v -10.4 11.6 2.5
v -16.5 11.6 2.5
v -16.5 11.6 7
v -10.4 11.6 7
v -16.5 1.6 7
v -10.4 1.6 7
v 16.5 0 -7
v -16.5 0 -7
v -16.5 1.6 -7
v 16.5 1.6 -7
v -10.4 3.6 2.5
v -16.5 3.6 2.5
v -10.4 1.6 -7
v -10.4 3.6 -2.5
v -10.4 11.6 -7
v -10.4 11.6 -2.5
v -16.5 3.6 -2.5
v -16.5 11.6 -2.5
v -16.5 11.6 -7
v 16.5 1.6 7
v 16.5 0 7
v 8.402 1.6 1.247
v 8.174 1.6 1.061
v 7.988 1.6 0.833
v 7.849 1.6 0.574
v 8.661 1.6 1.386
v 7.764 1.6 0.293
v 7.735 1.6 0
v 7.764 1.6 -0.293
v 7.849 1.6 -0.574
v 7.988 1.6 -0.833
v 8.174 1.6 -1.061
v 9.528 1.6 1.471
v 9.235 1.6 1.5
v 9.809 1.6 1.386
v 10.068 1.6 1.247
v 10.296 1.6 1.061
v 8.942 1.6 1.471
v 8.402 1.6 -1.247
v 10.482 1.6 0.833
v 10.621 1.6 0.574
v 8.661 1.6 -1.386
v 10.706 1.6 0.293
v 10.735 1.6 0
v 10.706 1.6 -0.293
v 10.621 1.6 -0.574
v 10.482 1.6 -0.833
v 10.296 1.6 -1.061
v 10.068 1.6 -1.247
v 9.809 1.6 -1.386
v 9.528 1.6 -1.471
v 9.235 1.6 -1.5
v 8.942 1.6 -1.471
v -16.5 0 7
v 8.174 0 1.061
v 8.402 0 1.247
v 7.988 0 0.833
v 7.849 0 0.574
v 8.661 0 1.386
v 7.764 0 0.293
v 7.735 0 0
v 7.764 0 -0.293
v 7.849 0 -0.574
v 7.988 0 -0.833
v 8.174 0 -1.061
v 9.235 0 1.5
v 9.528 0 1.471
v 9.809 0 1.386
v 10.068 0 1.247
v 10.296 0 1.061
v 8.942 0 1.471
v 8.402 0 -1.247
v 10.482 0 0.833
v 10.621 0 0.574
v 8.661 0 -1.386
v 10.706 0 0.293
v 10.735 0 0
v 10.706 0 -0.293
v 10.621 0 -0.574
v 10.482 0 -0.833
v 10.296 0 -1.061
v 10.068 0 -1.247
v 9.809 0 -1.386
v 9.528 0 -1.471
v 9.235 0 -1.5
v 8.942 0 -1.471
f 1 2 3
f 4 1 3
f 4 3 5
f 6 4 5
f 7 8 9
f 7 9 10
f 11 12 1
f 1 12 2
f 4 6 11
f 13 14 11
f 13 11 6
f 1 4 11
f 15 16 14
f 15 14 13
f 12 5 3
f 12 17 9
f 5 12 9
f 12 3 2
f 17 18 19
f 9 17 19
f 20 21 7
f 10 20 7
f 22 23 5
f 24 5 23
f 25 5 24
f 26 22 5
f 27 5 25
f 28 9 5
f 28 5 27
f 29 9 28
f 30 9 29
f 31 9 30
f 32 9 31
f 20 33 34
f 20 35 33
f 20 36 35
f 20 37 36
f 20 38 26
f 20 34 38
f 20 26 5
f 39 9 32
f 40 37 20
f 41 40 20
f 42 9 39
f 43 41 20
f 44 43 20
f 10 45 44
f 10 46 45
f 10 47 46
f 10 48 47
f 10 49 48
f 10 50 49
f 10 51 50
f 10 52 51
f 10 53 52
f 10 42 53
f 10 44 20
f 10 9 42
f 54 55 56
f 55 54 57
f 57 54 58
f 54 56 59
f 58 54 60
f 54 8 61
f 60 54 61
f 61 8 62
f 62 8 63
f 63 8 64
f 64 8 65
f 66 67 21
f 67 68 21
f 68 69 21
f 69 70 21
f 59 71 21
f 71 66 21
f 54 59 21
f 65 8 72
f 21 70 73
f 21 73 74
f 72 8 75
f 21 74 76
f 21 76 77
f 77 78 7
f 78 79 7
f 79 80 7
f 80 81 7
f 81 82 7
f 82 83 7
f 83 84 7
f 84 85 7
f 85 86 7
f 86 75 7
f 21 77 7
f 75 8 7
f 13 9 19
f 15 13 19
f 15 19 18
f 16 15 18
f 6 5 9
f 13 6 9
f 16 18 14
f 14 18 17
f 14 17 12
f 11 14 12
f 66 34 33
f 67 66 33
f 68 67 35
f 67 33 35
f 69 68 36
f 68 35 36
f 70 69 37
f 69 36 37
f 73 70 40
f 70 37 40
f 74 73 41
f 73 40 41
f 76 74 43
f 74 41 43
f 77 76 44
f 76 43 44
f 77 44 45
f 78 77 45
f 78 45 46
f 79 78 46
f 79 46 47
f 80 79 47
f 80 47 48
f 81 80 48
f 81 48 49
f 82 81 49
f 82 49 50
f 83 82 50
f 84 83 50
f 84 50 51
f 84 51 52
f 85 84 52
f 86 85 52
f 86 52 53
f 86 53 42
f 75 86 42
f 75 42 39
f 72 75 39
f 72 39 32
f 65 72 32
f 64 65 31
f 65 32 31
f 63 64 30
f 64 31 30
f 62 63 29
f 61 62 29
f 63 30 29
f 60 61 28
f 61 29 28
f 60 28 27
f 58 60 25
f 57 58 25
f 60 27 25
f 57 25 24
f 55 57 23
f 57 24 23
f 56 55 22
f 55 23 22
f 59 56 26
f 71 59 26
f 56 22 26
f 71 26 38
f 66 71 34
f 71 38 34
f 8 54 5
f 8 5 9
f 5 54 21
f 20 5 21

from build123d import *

# Parameters (mm, degrees)
SKETCH1_W           = 33
SKETCH1_H           = 14
BOSS_EXTRUDE1_DEPTH = 1.6
BOSS_EXTRUDE2_DEPTH = 6.1
SKETCH4_R           = 1.5
CUT_EXTRUDE1_DEPTH  = 6.1


with BuildPart() as part:
    # Sketch1 → Boss-Extrude1 (new body)
    with BuildSketch(Plane(origin=(0, 0, 0), x_dir=(1, 0, 0), z_dir=(0, 1, 0))):
        Rectangle(SKETCH1_W, SKETCH1_H)
    extrude(amount=BOSS_EXTRUDE1_DEPTH)

    # Sketch4 → Cut-Extrude1 (cut)
    with BuildSketch(Plane(origin=(0, 1.6, 0), x_dir=(1, 0, 0), z_dir=(0, 1, 0))):
        with Locations(Location((9.235, 0, 0), (0, 0, 270))):
            Circle(SKETCH4_R)
    extrude(amount=-CUT_EXTRUDE1_DEPTH, mode=Mode.SUBTRACT)


with BuildPart() as body_2:
    # Sketch2 → Boss-Extrude2 (new body)
    with BuildSketch(Plane.ZY.offset(16.5)):
        Polygon((-7, 1.6), (-7, 11.6), (-2.5, 11.6), (-2.5, 3.6), (2.5, 3.6), (2.5, 11.6), (7, 11.6), (7, 1.6), align=None)
    extrude(amount=-BOSS_EXTRUDE2_DEPTH)


solid = Compound([part.part, body_2.part])
